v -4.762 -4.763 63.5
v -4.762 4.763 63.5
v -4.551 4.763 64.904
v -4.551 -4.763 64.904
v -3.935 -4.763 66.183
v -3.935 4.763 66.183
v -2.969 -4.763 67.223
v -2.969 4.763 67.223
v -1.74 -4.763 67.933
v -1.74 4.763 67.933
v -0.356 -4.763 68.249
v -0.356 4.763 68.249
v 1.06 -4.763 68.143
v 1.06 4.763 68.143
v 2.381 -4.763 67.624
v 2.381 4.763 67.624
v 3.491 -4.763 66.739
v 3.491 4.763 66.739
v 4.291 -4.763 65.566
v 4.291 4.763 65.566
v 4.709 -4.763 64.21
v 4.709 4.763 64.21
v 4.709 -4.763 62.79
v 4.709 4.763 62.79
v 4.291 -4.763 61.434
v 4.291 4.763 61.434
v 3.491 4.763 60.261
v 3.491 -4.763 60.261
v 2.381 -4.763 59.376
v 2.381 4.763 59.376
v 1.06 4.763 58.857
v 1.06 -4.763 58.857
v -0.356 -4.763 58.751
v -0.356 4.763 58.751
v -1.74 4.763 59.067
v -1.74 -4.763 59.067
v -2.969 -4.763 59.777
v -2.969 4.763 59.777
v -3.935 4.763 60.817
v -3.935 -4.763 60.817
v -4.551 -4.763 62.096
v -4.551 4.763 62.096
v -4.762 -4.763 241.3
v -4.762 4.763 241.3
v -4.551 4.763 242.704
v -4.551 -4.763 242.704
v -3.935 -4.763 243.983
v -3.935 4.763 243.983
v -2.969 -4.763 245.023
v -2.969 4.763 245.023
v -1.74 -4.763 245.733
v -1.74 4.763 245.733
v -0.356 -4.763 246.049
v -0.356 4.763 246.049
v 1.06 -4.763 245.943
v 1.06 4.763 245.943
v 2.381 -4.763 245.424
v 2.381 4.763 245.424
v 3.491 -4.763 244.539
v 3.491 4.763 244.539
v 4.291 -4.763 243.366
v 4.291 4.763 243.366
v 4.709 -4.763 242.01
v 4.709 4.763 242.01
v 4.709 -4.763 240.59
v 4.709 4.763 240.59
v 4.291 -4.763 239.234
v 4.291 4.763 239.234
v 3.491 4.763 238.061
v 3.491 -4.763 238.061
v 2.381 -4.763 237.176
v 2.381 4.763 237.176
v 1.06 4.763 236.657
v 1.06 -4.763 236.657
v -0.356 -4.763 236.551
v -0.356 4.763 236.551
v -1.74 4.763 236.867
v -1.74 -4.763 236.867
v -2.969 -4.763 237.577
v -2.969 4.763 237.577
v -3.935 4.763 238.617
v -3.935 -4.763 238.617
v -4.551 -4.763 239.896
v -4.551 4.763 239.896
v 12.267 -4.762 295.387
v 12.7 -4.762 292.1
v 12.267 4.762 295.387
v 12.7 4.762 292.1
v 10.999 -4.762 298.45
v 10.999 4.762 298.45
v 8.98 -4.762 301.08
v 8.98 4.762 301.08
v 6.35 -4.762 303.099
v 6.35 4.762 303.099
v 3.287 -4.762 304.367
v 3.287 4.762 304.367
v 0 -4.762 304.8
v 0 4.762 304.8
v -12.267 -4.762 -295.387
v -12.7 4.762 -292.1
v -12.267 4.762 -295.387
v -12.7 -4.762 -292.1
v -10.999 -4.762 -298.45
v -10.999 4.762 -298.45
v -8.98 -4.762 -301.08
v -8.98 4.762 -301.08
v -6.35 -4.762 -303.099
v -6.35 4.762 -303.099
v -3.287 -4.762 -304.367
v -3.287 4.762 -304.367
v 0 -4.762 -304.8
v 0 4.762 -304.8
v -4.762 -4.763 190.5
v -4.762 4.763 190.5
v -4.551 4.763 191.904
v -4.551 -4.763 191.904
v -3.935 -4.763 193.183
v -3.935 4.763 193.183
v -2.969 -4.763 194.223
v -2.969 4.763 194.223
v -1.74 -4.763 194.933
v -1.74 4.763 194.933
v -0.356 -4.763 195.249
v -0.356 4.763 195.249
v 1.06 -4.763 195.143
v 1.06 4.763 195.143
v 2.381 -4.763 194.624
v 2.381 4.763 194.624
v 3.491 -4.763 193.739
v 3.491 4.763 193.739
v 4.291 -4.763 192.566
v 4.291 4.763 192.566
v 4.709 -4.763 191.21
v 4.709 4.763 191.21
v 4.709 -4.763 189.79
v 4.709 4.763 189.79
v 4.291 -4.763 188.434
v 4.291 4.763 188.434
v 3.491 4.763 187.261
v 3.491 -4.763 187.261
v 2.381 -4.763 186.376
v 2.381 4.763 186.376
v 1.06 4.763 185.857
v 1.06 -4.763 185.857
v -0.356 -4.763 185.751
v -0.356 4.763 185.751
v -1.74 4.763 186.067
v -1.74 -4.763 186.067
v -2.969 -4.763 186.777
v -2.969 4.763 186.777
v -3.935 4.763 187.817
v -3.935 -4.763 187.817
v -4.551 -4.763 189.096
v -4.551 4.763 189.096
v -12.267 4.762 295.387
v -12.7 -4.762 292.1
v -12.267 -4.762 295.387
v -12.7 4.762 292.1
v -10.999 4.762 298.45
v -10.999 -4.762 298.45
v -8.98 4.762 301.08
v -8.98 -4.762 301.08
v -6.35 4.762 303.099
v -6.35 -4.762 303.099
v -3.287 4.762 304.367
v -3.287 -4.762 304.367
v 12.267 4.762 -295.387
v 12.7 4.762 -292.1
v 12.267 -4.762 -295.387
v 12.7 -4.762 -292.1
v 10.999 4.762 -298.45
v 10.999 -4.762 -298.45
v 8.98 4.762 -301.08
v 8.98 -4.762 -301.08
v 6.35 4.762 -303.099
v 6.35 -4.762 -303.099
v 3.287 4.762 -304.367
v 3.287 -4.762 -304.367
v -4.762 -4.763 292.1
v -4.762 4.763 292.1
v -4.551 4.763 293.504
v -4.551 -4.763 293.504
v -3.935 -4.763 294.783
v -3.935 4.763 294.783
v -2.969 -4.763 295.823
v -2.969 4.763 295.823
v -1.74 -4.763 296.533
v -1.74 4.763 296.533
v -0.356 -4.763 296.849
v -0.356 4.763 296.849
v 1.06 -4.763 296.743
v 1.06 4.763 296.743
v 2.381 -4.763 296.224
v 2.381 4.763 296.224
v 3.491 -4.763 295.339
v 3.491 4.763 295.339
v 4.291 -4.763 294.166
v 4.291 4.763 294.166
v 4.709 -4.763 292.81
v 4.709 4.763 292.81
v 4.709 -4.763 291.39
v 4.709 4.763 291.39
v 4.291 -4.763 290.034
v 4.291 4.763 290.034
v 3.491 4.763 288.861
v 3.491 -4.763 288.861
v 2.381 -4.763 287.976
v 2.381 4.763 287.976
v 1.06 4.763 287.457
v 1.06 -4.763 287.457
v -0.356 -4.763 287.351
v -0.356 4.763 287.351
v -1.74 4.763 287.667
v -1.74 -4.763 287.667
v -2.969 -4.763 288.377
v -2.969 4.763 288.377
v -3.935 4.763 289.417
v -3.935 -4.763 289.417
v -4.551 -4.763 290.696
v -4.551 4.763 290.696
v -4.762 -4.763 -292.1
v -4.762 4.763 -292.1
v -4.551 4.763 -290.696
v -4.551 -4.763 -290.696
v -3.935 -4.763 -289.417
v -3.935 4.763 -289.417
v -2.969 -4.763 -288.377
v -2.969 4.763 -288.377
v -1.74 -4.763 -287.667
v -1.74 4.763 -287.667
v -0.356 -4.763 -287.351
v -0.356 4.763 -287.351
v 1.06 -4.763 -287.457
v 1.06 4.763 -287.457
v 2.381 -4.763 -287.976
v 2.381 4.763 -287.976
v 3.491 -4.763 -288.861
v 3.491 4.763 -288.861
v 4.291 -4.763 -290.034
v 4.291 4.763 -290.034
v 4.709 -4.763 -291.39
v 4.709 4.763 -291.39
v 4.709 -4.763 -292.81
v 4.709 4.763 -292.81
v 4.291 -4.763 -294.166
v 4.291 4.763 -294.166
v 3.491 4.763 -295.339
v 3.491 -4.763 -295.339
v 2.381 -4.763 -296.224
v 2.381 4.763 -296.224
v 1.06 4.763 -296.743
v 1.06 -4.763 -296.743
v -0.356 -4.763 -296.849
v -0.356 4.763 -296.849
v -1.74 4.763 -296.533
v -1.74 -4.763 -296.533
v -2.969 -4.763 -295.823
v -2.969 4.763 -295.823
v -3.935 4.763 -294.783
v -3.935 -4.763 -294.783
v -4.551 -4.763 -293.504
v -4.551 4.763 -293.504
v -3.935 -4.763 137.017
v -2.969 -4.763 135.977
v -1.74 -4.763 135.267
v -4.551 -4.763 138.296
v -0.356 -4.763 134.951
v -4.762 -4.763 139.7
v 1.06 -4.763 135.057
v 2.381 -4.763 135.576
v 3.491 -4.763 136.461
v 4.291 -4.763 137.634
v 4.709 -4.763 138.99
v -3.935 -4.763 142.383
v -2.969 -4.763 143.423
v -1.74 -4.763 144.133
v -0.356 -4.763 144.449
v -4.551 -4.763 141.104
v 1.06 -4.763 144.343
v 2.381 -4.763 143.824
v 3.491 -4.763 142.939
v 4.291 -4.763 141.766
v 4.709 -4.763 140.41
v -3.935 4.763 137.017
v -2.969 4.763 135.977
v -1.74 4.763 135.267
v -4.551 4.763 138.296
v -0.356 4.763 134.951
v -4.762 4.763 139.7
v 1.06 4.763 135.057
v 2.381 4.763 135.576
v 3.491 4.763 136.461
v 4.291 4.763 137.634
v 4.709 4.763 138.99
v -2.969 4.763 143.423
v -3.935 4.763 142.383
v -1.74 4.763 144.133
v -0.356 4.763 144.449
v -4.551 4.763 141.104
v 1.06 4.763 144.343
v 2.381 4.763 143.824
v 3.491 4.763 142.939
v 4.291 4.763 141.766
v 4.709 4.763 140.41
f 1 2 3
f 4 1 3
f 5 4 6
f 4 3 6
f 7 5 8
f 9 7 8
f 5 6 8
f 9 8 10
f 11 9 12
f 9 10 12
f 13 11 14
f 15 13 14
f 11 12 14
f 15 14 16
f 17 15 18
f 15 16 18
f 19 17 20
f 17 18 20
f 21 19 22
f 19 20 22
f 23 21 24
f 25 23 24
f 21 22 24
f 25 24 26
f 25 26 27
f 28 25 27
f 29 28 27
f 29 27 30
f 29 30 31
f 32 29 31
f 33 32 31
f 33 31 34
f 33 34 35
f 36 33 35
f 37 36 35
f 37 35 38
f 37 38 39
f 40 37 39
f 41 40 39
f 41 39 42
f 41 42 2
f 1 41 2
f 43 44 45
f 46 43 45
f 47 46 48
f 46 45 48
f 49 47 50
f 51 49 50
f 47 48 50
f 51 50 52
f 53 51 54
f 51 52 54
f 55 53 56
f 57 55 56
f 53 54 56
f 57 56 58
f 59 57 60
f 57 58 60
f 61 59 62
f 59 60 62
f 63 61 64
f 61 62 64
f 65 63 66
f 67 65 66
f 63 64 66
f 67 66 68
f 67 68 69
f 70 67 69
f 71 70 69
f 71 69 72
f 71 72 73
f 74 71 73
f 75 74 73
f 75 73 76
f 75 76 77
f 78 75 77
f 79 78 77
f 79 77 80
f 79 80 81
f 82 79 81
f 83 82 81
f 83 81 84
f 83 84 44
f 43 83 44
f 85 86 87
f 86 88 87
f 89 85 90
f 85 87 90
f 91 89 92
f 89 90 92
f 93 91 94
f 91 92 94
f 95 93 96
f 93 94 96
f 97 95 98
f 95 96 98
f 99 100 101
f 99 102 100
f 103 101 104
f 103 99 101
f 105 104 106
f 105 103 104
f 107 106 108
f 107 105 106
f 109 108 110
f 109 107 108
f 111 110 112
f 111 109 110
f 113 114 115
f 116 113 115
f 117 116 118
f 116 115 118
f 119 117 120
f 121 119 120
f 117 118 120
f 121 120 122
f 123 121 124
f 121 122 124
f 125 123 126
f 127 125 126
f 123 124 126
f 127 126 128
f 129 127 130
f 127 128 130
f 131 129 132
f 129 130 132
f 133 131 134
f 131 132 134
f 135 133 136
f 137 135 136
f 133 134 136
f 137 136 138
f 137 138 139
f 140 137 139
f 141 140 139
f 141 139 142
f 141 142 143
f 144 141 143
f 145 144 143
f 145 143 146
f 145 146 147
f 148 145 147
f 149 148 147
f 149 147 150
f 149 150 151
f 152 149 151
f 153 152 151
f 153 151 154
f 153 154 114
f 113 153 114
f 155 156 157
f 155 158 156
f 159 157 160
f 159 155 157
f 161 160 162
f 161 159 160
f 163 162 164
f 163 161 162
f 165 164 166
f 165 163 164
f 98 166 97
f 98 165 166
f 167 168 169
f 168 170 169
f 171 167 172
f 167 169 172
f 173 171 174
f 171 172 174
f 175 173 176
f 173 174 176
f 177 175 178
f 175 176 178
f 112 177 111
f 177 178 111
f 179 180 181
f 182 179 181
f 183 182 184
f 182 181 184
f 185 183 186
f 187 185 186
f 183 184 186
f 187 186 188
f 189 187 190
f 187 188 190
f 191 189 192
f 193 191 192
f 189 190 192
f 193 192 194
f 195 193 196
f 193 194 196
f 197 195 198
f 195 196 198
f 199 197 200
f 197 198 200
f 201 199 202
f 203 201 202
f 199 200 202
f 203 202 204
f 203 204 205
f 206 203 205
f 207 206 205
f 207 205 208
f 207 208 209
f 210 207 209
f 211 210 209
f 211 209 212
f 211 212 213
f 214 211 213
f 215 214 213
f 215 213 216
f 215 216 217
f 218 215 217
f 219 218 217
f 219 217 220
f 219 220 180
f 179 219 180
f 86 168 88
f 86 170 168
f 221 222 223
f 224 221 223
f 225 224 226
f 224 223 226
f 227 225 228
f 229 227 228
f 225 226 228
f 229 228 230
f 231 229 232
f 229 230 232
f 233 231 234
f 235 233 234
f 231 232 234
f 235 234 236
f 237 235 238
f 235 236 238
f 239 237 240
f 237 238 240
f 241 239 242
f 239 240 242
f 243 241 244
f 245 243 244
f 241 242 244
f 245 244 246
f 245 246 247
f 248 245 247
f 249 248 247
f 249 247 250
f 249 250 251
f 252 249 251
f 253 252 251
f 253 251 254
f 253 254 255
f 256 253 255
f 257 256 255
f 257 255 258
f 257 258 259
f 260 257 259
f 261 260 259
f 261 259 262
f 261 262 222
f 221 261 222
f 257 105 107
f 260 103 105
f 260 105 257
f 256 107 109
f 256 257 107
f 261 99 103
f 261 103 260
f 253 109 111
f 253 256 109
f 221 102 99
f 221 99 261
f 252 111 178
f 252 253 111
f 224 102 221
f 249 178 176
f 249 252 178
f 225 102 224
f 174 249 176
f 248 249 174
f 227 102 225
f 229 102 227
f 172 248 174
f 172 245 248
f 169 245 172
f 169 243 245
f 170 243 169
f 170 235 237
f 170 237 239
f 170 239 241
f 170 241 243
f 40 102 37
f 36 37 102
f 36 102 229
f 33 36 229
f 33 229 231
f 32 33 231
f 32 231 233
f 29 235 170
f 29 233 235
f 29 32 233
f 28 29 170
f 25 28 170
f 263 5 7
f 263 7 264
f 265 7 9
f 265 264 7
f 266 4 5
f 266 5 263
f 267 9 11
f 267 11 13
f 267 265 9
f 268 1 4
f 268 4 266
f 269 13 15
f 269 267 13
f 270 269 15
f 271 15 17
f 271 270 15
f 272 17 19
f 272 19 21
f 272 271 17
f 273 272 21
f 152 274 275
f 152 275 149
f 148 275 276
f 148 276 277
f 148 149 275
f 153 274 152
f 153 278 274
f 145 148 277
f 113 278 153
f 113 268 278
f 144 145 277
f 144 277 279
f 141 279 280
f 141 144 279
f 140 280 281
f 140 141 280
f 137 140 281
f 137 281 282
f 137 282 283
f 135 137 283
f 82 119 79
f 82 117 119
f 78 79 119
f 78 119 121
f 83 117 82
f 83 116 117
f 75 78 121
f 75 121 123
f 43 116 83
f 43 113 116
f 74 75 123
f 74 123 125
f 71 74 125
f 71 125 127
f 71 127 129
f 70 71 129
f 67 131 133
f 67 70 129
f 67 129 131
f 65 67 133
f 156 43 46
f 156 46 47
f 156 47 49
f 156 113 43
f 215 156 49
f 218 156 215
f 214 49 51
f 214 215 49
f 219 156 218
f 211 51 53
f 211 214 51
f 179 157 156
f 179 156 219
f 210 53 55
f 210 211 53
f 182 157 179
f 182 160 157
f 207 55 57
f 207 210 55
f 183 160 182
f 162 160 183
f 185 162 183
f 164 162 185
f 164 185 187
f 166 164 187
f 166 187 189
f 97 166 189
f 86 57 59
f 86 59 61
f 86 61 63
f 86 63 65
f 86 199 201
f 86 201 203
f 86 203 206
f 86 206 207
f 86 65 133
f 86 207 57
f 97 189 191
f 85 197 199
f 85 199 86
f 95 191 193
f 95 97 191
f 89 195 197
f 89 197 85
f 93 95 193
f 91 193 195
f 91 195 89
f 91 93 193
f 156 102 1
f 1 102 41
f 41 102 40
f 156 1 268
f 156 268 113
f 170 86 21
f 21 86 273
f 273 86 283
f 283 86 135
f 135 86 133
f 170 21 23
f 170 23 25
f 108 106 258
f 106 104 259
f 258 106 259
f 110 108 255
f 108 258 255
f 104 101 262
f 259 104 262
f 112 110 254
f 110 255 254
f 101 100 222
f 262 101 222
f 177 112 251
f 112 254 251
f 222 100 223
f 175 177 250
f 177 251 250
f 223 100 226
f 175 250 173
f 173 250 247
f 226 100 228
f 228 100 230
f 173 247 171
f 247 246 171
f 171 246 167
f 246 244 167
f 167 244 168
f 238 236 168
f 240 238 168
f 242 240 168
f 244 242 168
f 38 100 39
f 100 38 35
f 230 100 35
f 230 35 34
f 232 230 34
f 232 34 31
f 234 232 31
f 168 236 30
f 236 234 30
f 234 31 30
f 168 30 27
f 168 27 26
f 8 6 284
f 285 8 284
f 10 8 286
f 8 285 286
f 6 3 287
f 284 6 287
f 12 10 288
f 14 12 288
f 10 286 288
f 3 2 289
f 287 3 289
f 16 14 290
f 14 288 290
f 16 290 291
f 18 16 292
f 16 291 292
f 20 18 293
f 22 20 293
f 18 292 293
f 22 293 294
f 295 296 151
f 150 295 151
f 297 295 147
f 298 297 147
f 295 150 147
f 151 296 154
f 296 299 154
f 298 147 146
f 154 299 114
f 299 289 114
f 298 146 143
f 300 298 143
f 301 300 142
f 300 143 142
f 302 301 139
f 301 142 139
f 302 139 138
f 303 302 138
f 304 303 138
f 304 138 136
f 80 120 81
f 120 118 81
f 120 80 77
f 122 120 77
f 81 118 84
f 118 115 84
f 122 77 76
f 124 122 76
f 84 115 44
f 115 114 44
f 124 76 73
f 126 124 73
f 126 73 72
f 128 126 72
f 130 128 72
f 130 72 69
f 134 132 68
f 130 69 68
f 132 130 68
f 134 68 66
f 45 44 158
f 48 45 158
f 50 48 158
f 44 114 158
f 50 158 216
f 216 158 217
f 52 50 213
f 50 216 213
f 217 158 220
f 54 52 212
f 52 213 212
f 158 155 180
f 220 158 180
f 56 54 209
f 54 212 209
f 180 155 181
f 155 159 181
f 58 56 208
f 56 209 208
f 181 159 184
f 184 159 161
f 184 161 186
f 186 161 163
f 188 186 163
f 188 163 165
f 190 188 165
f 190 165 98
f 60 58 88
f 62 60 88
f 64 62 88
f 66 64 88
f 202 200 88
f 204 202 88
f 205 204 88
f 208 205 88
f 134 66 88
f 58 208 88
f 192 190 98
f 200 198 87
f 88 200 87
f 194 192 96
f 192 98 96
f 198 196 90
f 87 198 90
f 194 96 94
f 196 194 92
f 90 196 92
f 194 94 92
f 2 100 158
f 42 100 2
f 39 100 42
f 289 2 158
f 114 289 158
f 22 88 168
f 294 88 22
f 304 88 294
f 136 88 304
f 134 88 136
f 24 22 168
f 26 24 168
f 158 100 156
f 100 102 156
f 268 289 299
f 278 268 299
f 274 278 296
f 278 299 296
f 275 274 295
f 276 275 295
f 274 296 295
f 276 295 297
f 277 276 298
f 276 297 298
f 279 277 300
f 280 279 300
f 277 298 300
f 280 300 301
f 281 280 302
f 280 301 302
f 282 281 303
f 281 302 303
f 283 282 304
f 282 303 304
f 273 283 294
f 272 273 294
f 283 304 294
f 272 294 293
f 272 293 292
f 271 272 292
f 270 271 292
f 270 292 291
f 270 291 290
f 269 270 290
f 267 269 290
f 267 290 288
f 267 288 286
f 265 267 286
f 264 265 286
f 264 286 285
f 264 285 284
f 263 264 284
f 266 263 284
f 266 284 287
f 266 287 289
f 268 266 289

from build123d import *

# Parameters (mm, degrees)
F0_W     = 25.4
F0_H     = 609.6
F1_DEPTH = 4.7625
F2_R     = 12.69999
F4_D     = 9.525


# Not quite as in the source:
# - a fillet or chamfer is up to 0.001 mm smaller than in the source, because OpenCascade refuses the exact size


with BuildPart() as f1:
    # F0 (on Front) → F1 (new body, symmetric)
    with BuildSketch(Plane.XZ):
        Rectangle(F0_W, F0_H)
    extrude(amount=F1_DEPTH, both=True)

    # F2 (radius 12.7 in the source; OpenCascade refuses exactly that, so slightly less here)
    f2_edges = [f1.edges().sort_by_distance(p)[0] for p in [
        (12.7, 0, 304.8),
        (-12.7, 0, 304.8),
        (-12.7, 0, -304.8),
        (12.7, 0, -304.8),
    ]]
    fillet(f2_edges, radius=F2_R)

    # F4 (through all)
    with Locations(Plane.XZ.offset(4.7625)):
        with Locations((0, -292.1), (0, 292.1), (0, 63.5), (0, 241.3), (0, 190.5), (0, 139.7)):
            Hole(F4_D / 2)


solid = f1.part
